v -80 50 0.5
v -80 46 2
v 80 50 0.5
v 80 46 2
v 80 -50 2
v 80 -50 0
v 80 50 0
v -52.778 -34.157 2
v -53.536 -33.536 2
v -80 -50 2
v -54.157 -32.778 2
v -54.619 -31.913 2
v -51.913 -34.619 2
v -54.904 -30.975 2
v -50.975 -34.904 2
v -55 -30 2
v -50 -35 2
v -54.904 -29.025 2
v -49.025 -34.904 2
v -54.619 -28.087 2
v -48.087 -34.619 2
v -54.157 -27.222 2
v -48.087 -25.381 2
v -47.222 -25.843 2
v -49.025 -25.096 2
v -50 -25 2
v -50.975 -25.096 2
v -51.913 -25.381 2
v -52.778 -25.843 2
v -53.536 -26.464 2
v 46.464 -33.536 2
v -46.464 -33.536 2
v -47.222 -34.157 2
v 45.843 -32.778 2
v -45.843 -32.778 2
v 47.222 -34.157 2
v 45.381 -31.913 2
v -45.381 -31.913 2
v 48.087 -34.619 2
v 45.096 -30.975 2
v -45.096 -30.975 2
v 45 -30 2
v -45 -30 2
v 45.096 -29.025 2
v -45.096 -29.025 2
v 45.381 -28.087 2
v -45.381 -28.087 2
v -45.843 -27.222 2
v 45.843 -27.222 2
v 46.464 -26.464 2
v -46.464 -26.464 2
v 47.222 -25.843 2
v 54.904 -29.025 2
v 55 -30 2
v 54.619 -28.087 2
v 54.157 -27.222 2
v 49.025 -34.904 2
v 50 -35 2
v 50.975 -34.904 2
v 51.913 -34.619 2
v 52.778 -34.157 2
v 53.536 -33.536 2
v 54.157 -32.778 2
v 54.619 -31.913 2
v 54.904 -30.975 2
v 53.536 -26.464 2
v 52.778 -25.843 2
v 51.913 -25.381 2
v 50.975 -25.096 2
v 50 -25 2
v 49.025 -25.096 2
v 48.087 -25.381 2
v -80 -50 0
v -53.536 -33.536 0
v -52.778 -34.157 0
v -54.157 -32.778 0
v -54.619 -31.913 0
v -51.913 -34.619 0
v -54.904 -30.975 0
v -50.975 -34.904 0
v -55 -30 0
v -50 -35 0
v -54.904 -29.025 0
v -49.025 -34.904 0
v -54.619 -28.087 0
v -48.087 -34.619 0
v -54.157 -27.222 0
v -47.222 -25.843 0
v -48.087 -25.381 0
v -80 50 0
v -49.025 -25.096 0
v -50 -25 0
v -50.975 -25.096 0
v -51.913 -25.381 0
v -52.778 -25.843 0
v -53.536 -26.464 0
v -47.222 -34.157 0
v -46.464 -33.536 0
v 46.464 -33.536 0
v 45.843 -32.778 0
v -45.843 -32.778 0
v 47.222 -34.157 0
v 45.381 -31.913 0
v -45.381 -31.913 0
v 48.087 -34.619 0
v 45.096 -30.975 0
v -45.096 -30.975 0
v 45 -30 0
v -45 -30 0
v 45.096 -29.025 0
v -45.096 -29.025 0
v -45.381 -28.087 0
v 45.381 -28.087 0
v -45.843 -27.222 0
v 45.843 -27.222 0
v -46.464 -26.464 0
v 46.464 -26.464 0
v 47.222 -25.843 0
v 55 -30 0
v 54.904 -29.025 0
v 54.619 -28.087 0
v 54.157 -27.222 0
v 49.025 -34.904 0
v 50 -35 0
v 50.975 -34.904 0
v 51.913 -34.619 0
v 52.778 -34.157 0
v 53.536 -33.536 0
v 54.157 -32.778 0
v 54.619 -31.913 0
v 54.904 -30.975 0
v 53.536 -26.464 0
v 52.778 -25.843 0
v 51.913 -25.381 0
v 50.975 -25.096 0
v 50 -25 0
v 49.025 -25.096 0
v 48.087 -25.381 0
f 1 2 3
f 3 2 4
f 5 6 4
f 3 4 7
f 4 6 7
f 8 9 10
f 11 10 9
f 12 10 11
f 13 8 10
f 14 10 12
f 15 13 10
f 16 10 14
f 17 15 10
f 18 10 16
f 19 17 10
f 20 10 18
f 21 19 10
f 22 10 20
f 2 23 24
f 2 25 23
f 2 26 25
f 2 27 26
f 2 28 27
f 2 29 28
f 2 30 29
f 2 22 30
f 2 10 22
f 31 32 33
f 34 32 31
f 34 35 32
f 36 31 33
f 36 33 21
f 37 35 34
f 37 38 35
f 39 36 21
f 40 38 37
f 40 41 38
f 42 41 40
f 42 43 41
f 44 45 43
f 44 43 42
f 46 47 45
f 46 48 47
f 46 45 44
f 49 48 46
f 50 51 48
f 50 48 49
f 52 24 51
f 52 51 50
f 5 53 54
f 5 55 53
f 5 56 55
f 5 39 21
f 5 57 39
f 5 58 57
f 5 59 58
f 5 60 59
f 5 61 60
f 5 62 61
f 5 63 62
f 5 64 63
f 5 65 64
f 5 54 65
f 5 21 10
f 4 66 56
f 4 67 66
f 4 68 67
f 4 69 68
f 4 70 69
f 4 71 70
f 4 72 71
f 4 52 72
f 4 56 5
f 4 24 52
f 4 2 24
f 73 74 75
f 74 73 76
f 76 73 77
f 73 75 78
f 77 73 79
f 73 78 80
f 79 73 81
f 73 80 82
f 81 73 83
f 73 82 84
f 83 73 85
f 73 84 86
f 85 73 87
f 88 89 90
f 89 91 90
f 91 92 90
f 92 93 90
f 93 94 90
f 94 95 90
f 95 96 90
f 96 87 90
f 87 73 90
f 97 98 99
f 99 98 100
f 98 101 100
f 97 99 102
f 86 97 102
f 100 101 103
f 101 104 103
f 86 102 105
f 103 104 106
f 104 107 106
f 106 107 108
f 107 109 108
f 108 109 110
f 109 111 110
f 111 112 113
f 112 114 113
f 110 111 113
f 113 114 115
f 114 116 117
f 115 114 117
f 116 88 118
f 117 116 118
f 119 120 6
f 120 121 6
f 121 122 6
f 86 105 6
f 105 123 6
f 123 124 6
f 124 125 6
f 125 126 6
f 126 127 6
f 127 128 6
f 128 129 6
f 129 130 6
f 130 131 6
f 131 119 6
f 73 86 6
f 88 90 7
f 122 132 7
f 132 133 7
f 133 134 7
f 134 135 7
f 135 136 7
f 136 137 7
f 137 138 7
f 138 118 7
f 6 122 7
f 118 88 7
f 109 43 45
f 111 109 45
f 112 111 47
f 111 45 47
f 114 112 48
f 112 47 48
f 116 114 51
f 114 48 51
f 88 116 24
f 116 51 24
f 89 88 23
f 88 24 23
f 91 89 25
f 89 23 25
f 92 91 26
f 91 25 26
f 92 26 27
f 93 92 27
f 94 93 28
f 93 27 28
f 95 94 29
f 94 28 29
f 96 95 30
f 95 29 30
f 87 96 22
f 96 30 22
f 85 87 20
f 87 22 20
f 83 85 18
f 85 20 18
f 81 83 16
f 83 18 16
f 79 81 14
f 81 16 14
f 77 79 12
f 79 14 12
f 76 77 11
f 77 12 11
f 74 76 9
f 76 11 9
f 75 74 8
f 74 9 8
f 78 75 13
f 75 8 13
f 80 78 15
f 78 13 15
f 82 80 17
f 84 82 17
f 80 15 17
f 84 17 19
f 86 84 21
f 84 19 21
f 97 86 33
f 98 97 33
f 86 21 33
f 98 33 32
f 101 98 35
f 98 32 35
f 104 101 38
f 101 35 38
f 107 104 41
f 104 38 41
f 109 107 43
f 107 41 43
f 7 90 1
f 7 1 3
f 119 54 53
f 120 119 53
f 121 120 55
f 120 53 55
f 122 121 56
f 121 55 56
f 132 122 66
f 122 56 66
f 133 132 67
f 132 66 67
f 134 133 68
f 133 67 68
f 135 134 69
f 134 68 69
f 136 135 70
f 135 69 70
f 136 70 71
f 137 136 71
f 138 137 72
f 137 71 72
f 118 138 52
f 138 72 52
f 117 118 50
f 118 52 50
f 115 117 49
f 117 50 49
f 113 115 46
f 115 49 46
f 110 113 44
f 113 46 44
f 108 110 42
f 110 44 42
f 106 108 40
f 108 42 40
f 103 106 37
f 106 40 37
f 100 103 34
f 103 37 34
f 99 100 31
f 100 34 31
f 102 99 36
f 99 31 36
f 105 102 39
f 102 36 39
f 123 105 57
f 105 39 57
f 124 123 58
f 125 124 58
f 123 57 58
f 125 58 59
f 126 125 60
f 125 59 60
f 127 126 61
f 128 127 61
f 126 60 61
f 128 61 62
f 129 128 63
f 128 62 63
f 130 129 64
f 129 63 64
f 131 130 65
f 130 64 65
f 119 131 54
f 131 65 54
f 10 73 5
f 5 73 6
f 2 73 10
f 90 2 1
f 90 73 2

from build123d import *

# Parameters (mm, degrees)
SKETCH_W      = 160
SKETCH_H      = 100
PAD_DEPTH     = 2
CHAMFER_SIZE2 = 4
CHAMFER_SIZE  = 1.5
SKETCH001_R   = 5
POCKET_DEPTH  = 2


with BuildPart() as part:
    # Sketch → Pad (new body)
    with BuildSketch(Plane.XY):
        Rectangle(SKETCH_W, SKETCH_H)
    extrude(amount=PAD_DEPTH)

    # Chamfer
    chamfer_edges = [part.edges().sort_by_distance(p)[0] for p in [
        (0, 50, 2),
    ]]
    chamfer_side = part.faces().sort_by_distance((0, 50, 1))[0]
    chamfer(chamfer_edges, length=CHAMFER_SIZE, length2=CHAMFER_SIZE2, reference=chamfer_side)

    # Sketch001 (on Face5 of Chamfer) → Pocket (cut)
    with BuildSketch(Plane.XY.offset(2)):
        with Locations((-50, -30)):
            Circle(SKETCH001_R)
        with Locations((50, -30)):
            Circle(SKETCH001_R)
    extrude(amount=-POCKET_DEPTH, mode=Mode.SUBTRACT)


solid = part.part
